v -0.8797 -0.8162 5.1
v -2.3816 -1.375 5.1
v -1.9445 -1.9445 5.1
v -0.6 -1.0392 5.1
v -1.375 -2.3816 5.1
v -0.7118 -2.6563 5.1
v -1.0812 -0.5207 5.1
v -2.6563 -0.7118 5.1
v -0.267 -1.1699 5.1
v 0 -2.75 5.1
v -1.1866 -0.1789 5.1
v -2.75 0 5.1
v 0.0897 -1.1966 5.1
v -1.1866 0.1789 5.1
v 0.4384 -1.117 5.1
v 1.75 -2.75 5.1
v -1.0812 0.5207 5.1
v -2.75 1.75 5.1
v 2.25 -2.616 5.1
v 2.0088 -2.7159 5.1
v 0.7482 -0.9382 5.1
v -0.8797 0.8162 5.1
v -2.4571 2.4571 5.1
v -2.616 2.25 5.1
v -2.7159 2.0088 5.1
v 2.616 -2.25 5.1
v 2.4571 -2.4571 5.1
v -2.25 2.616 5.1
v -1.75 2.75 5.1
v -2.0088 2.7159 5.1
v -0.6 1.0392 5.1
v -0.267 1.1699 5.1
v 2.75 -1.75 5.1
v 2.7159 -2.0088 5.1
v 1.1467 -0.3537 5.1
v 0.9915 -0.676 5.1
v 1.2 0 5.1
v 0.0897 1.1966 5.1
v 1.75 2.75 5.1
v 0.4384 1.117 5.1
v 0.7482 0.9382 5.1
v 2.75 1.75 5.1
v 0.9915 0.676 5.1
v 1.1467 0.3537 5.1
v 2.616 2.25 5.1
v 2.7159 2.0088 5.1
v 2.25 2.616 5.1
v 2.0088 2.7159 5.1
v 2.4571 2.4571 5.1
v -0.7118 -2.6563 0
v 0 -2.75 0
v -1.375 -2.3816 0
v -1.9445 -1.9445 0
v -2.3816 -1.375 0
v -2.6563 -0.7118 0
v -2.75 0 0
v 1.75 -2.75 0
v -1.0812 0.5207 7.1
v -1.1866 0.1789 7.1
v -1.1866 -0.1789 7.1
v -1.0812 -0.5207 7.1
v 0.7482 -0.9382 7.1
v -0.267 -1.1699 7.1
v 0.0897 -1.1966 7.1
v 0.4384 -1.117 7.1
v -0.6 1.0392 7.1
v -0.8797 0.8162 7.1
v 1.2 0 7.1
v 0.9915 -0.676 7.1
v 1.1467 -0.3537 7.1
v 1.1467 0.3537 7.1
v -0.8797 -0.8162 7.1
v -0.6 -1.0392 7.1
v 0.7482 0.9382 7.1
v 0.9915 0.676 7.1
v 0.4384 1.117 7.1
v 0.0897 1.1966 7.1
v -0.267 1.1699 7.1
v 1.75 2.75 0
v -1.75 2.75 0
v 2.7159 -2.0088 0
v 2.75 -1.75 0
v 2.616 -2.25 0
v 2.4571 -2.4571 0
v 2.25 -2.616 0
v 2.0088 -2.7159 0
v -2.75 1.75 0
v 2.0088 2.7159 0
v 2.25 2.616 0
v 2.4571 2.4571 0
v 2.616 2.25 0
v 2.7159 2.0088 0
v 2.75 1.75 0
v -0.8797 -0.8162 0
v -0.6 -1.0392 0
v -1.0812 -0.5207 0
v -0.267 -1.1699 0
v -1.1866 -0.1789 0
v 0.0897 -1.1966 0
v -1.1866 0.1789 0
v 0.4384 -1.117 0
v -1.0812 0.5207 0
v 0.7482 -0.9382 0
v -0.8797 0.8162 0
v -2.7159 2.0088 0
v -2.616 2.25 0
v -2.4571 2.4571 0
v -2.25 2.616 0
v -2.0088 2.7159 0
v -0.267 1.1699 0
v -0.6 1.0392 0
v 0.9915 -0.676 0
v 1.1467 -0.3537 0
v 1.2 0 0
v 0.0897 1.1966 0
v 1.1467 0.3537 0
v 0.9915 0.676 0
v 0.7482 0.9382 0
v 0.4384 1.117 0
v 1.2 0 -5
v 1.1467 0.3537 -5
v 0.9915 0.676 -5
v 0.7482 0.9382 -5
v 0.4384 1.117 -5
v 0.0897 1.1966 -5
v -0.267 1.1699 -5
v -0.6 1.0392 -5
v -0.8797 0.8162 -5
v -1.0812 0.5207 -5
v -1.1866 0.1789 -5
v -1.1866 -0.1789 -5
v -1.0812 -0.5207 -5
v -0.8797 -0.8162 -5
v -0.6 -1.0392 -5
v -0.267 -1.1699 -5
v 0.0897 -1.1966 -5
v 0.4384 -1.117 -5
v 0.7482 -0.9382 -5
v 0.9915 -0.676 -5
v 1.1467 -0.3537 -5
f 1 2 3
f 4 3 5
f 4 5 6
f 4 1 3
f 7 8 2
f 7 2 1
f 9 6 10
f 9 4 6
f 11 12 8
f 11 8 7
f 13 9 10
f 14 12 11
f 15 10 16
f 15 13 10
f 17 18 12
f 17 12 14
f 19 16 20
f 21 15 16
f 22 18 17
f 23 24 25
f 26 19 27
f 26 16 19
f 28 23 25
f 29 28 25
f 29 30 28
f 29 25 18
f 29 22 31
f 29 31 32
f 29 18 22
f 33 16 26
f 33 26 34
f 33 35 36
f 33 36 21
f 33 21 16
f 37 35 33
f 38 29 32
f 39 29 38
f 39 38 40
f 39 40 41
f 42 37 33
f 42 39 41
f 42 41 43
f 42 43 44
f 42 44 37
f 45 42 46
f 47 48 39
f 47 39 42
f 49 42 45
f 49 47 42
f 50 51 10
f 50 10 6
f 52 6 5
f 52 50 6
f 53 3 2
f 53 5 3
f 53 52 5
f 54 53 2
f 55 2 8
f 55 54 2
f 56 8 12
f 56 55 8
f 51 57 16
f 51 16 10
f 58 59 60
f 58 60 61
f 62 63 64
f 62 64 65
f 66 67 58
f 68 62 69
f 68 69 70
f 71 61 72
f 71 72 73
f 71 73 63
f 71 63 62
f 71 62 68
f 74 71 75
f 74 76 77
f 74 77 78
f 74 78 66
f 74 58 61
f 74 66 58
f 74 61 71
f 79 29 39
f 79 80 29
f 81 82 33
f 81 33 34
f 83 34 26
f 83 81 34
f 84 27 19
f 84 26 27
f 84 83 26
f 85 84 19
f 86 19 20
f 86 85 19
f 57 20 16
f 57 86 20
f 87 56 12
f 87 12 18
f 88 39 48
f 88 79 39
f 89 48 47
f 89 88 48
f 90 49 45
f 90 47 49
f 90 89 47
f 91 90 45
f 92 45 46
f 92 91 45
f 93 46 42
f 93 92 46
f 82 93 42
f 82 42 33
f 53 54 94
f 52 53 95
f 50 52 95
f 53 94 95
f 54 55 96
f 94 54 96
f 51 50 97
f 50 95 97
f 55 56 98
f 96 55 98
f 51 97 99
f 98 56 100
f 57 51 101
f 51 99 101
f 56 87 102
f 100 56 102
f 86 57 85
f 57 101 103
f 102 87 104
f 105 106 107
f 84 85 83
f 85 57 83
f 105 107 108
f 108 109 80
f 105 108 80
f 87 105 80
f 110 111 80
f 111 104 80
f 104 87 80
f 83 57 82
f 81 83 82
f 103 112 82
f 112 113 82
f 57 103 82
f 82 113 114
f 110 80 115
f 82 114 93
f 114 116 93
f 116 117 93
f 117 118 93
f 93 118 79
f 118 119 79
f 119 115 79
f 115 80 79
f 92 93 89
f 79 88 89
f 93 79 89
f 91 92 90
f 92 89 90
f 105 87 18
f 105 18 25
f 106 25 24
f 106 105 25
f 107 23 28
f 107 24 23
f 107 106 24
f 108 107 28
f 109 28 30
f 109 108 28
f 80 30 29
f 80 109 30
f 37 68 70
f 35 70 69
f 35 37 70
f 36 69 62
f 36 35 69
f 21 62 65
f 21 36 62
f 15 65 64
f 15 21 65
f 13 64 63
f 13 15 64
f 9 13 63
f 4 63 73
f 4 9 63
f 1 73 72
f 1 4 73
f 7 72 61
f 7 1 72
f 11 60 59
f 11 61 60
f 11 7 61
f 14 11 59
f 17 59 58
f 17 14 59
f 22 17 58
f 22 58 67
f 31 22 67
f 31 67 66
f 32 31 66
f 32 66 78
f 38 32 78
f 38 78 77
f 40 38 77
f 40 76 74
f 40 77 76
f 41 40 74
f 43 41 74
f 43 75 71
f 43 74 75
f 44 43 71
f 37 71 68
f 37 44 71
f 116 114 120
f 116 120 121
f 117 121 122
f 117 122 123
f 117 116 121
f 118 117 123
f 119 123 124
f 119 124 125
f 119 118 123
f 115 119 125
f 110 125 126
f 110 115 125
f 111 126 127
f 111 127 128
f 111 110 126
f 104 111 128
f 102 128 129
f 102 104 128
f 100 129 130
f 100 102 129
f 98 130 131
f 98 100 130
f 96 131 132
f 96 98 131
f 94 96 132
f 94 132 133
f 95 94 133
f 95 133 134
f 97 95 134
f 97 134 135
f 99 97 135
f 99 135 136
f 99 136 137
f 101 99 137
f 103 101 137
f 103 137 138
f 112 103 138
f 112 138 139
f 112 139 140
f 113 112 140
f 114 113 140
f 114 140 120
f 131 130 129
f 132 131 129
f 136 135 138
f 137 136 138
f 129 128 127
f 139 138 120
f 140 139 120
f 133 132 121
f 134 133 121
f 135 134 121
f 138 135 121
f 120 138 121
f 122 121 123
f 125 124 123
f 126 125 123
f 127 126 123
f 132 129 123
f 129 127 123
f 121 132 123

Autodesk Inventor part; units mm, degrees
ref_plane "YZ Plane" through (0, 0, 0) normal (1, 0, 0) x (0, 1, 0)
ref_plane "XZ Plane" through (0, 0, 0) normal (0, 1, 0) x (-1, 0, 0)
ref_plane "XY Plane" through (0, 0, 0) normal (0, 0, 1) x (1, 0, 0)
sketch "Sketch1" plane through (0, 0, 0) normal (0, 0, 1) x (1, 0, 0)
  circle A0 centre (0, 0) radius 1.2
  circle A1 centre (0, 0) radius 2.75
  line L0 (-1.75, 2.75) -> (1.75, 2.75)
  line L1 (2.75, 1.75) -> (2.75, -1.75)
  line L2 (1.75, -2.75) -> (-1.75, -2.75)
  line L3 (-2.75, -1.75) -> (-2.75, 1.75)
  arc A2 (-1.75, 2.75) -> (-2.75, 1.75) centre (-1.75, 1.75) ccw
  arc A3 (2.75, 1.75) -> (1.75, 2.75) centre (1.75, 1.75) ccw
  arc A4 (1.75, -2.75) -> (2.75, -1.75) centre (1.75, -1.75) ccw
  arc A5 (-2.75, -1.75) -> (-1.75, -2.75) centre (-1.75, -1.75) ccw
  point P0 (-2.75, 0)
  point P1 (0, -2.75)
  dimension "d0" = 2.4
  dimension "d1" = 5.5
  dimension "d2" = 1
  dimension "d3" = 1
  dimension "d4" = 1
extrude "Extrusion1" add sketch "Sketch1" against normal blind 5 contours A0
extrude "Extrusion2" add sketch "Sketch1" along normal blind 5.1 contours A0 | A1 | L1 A4 L2 A1 | A1 L0 A3 L1 | A1 L3 A2 L0
extrude "Extrusion3" add sketch "Sketch1" along normal blind 7.1 contours A0
properties part number "rpi_base_back_3DPrint"
